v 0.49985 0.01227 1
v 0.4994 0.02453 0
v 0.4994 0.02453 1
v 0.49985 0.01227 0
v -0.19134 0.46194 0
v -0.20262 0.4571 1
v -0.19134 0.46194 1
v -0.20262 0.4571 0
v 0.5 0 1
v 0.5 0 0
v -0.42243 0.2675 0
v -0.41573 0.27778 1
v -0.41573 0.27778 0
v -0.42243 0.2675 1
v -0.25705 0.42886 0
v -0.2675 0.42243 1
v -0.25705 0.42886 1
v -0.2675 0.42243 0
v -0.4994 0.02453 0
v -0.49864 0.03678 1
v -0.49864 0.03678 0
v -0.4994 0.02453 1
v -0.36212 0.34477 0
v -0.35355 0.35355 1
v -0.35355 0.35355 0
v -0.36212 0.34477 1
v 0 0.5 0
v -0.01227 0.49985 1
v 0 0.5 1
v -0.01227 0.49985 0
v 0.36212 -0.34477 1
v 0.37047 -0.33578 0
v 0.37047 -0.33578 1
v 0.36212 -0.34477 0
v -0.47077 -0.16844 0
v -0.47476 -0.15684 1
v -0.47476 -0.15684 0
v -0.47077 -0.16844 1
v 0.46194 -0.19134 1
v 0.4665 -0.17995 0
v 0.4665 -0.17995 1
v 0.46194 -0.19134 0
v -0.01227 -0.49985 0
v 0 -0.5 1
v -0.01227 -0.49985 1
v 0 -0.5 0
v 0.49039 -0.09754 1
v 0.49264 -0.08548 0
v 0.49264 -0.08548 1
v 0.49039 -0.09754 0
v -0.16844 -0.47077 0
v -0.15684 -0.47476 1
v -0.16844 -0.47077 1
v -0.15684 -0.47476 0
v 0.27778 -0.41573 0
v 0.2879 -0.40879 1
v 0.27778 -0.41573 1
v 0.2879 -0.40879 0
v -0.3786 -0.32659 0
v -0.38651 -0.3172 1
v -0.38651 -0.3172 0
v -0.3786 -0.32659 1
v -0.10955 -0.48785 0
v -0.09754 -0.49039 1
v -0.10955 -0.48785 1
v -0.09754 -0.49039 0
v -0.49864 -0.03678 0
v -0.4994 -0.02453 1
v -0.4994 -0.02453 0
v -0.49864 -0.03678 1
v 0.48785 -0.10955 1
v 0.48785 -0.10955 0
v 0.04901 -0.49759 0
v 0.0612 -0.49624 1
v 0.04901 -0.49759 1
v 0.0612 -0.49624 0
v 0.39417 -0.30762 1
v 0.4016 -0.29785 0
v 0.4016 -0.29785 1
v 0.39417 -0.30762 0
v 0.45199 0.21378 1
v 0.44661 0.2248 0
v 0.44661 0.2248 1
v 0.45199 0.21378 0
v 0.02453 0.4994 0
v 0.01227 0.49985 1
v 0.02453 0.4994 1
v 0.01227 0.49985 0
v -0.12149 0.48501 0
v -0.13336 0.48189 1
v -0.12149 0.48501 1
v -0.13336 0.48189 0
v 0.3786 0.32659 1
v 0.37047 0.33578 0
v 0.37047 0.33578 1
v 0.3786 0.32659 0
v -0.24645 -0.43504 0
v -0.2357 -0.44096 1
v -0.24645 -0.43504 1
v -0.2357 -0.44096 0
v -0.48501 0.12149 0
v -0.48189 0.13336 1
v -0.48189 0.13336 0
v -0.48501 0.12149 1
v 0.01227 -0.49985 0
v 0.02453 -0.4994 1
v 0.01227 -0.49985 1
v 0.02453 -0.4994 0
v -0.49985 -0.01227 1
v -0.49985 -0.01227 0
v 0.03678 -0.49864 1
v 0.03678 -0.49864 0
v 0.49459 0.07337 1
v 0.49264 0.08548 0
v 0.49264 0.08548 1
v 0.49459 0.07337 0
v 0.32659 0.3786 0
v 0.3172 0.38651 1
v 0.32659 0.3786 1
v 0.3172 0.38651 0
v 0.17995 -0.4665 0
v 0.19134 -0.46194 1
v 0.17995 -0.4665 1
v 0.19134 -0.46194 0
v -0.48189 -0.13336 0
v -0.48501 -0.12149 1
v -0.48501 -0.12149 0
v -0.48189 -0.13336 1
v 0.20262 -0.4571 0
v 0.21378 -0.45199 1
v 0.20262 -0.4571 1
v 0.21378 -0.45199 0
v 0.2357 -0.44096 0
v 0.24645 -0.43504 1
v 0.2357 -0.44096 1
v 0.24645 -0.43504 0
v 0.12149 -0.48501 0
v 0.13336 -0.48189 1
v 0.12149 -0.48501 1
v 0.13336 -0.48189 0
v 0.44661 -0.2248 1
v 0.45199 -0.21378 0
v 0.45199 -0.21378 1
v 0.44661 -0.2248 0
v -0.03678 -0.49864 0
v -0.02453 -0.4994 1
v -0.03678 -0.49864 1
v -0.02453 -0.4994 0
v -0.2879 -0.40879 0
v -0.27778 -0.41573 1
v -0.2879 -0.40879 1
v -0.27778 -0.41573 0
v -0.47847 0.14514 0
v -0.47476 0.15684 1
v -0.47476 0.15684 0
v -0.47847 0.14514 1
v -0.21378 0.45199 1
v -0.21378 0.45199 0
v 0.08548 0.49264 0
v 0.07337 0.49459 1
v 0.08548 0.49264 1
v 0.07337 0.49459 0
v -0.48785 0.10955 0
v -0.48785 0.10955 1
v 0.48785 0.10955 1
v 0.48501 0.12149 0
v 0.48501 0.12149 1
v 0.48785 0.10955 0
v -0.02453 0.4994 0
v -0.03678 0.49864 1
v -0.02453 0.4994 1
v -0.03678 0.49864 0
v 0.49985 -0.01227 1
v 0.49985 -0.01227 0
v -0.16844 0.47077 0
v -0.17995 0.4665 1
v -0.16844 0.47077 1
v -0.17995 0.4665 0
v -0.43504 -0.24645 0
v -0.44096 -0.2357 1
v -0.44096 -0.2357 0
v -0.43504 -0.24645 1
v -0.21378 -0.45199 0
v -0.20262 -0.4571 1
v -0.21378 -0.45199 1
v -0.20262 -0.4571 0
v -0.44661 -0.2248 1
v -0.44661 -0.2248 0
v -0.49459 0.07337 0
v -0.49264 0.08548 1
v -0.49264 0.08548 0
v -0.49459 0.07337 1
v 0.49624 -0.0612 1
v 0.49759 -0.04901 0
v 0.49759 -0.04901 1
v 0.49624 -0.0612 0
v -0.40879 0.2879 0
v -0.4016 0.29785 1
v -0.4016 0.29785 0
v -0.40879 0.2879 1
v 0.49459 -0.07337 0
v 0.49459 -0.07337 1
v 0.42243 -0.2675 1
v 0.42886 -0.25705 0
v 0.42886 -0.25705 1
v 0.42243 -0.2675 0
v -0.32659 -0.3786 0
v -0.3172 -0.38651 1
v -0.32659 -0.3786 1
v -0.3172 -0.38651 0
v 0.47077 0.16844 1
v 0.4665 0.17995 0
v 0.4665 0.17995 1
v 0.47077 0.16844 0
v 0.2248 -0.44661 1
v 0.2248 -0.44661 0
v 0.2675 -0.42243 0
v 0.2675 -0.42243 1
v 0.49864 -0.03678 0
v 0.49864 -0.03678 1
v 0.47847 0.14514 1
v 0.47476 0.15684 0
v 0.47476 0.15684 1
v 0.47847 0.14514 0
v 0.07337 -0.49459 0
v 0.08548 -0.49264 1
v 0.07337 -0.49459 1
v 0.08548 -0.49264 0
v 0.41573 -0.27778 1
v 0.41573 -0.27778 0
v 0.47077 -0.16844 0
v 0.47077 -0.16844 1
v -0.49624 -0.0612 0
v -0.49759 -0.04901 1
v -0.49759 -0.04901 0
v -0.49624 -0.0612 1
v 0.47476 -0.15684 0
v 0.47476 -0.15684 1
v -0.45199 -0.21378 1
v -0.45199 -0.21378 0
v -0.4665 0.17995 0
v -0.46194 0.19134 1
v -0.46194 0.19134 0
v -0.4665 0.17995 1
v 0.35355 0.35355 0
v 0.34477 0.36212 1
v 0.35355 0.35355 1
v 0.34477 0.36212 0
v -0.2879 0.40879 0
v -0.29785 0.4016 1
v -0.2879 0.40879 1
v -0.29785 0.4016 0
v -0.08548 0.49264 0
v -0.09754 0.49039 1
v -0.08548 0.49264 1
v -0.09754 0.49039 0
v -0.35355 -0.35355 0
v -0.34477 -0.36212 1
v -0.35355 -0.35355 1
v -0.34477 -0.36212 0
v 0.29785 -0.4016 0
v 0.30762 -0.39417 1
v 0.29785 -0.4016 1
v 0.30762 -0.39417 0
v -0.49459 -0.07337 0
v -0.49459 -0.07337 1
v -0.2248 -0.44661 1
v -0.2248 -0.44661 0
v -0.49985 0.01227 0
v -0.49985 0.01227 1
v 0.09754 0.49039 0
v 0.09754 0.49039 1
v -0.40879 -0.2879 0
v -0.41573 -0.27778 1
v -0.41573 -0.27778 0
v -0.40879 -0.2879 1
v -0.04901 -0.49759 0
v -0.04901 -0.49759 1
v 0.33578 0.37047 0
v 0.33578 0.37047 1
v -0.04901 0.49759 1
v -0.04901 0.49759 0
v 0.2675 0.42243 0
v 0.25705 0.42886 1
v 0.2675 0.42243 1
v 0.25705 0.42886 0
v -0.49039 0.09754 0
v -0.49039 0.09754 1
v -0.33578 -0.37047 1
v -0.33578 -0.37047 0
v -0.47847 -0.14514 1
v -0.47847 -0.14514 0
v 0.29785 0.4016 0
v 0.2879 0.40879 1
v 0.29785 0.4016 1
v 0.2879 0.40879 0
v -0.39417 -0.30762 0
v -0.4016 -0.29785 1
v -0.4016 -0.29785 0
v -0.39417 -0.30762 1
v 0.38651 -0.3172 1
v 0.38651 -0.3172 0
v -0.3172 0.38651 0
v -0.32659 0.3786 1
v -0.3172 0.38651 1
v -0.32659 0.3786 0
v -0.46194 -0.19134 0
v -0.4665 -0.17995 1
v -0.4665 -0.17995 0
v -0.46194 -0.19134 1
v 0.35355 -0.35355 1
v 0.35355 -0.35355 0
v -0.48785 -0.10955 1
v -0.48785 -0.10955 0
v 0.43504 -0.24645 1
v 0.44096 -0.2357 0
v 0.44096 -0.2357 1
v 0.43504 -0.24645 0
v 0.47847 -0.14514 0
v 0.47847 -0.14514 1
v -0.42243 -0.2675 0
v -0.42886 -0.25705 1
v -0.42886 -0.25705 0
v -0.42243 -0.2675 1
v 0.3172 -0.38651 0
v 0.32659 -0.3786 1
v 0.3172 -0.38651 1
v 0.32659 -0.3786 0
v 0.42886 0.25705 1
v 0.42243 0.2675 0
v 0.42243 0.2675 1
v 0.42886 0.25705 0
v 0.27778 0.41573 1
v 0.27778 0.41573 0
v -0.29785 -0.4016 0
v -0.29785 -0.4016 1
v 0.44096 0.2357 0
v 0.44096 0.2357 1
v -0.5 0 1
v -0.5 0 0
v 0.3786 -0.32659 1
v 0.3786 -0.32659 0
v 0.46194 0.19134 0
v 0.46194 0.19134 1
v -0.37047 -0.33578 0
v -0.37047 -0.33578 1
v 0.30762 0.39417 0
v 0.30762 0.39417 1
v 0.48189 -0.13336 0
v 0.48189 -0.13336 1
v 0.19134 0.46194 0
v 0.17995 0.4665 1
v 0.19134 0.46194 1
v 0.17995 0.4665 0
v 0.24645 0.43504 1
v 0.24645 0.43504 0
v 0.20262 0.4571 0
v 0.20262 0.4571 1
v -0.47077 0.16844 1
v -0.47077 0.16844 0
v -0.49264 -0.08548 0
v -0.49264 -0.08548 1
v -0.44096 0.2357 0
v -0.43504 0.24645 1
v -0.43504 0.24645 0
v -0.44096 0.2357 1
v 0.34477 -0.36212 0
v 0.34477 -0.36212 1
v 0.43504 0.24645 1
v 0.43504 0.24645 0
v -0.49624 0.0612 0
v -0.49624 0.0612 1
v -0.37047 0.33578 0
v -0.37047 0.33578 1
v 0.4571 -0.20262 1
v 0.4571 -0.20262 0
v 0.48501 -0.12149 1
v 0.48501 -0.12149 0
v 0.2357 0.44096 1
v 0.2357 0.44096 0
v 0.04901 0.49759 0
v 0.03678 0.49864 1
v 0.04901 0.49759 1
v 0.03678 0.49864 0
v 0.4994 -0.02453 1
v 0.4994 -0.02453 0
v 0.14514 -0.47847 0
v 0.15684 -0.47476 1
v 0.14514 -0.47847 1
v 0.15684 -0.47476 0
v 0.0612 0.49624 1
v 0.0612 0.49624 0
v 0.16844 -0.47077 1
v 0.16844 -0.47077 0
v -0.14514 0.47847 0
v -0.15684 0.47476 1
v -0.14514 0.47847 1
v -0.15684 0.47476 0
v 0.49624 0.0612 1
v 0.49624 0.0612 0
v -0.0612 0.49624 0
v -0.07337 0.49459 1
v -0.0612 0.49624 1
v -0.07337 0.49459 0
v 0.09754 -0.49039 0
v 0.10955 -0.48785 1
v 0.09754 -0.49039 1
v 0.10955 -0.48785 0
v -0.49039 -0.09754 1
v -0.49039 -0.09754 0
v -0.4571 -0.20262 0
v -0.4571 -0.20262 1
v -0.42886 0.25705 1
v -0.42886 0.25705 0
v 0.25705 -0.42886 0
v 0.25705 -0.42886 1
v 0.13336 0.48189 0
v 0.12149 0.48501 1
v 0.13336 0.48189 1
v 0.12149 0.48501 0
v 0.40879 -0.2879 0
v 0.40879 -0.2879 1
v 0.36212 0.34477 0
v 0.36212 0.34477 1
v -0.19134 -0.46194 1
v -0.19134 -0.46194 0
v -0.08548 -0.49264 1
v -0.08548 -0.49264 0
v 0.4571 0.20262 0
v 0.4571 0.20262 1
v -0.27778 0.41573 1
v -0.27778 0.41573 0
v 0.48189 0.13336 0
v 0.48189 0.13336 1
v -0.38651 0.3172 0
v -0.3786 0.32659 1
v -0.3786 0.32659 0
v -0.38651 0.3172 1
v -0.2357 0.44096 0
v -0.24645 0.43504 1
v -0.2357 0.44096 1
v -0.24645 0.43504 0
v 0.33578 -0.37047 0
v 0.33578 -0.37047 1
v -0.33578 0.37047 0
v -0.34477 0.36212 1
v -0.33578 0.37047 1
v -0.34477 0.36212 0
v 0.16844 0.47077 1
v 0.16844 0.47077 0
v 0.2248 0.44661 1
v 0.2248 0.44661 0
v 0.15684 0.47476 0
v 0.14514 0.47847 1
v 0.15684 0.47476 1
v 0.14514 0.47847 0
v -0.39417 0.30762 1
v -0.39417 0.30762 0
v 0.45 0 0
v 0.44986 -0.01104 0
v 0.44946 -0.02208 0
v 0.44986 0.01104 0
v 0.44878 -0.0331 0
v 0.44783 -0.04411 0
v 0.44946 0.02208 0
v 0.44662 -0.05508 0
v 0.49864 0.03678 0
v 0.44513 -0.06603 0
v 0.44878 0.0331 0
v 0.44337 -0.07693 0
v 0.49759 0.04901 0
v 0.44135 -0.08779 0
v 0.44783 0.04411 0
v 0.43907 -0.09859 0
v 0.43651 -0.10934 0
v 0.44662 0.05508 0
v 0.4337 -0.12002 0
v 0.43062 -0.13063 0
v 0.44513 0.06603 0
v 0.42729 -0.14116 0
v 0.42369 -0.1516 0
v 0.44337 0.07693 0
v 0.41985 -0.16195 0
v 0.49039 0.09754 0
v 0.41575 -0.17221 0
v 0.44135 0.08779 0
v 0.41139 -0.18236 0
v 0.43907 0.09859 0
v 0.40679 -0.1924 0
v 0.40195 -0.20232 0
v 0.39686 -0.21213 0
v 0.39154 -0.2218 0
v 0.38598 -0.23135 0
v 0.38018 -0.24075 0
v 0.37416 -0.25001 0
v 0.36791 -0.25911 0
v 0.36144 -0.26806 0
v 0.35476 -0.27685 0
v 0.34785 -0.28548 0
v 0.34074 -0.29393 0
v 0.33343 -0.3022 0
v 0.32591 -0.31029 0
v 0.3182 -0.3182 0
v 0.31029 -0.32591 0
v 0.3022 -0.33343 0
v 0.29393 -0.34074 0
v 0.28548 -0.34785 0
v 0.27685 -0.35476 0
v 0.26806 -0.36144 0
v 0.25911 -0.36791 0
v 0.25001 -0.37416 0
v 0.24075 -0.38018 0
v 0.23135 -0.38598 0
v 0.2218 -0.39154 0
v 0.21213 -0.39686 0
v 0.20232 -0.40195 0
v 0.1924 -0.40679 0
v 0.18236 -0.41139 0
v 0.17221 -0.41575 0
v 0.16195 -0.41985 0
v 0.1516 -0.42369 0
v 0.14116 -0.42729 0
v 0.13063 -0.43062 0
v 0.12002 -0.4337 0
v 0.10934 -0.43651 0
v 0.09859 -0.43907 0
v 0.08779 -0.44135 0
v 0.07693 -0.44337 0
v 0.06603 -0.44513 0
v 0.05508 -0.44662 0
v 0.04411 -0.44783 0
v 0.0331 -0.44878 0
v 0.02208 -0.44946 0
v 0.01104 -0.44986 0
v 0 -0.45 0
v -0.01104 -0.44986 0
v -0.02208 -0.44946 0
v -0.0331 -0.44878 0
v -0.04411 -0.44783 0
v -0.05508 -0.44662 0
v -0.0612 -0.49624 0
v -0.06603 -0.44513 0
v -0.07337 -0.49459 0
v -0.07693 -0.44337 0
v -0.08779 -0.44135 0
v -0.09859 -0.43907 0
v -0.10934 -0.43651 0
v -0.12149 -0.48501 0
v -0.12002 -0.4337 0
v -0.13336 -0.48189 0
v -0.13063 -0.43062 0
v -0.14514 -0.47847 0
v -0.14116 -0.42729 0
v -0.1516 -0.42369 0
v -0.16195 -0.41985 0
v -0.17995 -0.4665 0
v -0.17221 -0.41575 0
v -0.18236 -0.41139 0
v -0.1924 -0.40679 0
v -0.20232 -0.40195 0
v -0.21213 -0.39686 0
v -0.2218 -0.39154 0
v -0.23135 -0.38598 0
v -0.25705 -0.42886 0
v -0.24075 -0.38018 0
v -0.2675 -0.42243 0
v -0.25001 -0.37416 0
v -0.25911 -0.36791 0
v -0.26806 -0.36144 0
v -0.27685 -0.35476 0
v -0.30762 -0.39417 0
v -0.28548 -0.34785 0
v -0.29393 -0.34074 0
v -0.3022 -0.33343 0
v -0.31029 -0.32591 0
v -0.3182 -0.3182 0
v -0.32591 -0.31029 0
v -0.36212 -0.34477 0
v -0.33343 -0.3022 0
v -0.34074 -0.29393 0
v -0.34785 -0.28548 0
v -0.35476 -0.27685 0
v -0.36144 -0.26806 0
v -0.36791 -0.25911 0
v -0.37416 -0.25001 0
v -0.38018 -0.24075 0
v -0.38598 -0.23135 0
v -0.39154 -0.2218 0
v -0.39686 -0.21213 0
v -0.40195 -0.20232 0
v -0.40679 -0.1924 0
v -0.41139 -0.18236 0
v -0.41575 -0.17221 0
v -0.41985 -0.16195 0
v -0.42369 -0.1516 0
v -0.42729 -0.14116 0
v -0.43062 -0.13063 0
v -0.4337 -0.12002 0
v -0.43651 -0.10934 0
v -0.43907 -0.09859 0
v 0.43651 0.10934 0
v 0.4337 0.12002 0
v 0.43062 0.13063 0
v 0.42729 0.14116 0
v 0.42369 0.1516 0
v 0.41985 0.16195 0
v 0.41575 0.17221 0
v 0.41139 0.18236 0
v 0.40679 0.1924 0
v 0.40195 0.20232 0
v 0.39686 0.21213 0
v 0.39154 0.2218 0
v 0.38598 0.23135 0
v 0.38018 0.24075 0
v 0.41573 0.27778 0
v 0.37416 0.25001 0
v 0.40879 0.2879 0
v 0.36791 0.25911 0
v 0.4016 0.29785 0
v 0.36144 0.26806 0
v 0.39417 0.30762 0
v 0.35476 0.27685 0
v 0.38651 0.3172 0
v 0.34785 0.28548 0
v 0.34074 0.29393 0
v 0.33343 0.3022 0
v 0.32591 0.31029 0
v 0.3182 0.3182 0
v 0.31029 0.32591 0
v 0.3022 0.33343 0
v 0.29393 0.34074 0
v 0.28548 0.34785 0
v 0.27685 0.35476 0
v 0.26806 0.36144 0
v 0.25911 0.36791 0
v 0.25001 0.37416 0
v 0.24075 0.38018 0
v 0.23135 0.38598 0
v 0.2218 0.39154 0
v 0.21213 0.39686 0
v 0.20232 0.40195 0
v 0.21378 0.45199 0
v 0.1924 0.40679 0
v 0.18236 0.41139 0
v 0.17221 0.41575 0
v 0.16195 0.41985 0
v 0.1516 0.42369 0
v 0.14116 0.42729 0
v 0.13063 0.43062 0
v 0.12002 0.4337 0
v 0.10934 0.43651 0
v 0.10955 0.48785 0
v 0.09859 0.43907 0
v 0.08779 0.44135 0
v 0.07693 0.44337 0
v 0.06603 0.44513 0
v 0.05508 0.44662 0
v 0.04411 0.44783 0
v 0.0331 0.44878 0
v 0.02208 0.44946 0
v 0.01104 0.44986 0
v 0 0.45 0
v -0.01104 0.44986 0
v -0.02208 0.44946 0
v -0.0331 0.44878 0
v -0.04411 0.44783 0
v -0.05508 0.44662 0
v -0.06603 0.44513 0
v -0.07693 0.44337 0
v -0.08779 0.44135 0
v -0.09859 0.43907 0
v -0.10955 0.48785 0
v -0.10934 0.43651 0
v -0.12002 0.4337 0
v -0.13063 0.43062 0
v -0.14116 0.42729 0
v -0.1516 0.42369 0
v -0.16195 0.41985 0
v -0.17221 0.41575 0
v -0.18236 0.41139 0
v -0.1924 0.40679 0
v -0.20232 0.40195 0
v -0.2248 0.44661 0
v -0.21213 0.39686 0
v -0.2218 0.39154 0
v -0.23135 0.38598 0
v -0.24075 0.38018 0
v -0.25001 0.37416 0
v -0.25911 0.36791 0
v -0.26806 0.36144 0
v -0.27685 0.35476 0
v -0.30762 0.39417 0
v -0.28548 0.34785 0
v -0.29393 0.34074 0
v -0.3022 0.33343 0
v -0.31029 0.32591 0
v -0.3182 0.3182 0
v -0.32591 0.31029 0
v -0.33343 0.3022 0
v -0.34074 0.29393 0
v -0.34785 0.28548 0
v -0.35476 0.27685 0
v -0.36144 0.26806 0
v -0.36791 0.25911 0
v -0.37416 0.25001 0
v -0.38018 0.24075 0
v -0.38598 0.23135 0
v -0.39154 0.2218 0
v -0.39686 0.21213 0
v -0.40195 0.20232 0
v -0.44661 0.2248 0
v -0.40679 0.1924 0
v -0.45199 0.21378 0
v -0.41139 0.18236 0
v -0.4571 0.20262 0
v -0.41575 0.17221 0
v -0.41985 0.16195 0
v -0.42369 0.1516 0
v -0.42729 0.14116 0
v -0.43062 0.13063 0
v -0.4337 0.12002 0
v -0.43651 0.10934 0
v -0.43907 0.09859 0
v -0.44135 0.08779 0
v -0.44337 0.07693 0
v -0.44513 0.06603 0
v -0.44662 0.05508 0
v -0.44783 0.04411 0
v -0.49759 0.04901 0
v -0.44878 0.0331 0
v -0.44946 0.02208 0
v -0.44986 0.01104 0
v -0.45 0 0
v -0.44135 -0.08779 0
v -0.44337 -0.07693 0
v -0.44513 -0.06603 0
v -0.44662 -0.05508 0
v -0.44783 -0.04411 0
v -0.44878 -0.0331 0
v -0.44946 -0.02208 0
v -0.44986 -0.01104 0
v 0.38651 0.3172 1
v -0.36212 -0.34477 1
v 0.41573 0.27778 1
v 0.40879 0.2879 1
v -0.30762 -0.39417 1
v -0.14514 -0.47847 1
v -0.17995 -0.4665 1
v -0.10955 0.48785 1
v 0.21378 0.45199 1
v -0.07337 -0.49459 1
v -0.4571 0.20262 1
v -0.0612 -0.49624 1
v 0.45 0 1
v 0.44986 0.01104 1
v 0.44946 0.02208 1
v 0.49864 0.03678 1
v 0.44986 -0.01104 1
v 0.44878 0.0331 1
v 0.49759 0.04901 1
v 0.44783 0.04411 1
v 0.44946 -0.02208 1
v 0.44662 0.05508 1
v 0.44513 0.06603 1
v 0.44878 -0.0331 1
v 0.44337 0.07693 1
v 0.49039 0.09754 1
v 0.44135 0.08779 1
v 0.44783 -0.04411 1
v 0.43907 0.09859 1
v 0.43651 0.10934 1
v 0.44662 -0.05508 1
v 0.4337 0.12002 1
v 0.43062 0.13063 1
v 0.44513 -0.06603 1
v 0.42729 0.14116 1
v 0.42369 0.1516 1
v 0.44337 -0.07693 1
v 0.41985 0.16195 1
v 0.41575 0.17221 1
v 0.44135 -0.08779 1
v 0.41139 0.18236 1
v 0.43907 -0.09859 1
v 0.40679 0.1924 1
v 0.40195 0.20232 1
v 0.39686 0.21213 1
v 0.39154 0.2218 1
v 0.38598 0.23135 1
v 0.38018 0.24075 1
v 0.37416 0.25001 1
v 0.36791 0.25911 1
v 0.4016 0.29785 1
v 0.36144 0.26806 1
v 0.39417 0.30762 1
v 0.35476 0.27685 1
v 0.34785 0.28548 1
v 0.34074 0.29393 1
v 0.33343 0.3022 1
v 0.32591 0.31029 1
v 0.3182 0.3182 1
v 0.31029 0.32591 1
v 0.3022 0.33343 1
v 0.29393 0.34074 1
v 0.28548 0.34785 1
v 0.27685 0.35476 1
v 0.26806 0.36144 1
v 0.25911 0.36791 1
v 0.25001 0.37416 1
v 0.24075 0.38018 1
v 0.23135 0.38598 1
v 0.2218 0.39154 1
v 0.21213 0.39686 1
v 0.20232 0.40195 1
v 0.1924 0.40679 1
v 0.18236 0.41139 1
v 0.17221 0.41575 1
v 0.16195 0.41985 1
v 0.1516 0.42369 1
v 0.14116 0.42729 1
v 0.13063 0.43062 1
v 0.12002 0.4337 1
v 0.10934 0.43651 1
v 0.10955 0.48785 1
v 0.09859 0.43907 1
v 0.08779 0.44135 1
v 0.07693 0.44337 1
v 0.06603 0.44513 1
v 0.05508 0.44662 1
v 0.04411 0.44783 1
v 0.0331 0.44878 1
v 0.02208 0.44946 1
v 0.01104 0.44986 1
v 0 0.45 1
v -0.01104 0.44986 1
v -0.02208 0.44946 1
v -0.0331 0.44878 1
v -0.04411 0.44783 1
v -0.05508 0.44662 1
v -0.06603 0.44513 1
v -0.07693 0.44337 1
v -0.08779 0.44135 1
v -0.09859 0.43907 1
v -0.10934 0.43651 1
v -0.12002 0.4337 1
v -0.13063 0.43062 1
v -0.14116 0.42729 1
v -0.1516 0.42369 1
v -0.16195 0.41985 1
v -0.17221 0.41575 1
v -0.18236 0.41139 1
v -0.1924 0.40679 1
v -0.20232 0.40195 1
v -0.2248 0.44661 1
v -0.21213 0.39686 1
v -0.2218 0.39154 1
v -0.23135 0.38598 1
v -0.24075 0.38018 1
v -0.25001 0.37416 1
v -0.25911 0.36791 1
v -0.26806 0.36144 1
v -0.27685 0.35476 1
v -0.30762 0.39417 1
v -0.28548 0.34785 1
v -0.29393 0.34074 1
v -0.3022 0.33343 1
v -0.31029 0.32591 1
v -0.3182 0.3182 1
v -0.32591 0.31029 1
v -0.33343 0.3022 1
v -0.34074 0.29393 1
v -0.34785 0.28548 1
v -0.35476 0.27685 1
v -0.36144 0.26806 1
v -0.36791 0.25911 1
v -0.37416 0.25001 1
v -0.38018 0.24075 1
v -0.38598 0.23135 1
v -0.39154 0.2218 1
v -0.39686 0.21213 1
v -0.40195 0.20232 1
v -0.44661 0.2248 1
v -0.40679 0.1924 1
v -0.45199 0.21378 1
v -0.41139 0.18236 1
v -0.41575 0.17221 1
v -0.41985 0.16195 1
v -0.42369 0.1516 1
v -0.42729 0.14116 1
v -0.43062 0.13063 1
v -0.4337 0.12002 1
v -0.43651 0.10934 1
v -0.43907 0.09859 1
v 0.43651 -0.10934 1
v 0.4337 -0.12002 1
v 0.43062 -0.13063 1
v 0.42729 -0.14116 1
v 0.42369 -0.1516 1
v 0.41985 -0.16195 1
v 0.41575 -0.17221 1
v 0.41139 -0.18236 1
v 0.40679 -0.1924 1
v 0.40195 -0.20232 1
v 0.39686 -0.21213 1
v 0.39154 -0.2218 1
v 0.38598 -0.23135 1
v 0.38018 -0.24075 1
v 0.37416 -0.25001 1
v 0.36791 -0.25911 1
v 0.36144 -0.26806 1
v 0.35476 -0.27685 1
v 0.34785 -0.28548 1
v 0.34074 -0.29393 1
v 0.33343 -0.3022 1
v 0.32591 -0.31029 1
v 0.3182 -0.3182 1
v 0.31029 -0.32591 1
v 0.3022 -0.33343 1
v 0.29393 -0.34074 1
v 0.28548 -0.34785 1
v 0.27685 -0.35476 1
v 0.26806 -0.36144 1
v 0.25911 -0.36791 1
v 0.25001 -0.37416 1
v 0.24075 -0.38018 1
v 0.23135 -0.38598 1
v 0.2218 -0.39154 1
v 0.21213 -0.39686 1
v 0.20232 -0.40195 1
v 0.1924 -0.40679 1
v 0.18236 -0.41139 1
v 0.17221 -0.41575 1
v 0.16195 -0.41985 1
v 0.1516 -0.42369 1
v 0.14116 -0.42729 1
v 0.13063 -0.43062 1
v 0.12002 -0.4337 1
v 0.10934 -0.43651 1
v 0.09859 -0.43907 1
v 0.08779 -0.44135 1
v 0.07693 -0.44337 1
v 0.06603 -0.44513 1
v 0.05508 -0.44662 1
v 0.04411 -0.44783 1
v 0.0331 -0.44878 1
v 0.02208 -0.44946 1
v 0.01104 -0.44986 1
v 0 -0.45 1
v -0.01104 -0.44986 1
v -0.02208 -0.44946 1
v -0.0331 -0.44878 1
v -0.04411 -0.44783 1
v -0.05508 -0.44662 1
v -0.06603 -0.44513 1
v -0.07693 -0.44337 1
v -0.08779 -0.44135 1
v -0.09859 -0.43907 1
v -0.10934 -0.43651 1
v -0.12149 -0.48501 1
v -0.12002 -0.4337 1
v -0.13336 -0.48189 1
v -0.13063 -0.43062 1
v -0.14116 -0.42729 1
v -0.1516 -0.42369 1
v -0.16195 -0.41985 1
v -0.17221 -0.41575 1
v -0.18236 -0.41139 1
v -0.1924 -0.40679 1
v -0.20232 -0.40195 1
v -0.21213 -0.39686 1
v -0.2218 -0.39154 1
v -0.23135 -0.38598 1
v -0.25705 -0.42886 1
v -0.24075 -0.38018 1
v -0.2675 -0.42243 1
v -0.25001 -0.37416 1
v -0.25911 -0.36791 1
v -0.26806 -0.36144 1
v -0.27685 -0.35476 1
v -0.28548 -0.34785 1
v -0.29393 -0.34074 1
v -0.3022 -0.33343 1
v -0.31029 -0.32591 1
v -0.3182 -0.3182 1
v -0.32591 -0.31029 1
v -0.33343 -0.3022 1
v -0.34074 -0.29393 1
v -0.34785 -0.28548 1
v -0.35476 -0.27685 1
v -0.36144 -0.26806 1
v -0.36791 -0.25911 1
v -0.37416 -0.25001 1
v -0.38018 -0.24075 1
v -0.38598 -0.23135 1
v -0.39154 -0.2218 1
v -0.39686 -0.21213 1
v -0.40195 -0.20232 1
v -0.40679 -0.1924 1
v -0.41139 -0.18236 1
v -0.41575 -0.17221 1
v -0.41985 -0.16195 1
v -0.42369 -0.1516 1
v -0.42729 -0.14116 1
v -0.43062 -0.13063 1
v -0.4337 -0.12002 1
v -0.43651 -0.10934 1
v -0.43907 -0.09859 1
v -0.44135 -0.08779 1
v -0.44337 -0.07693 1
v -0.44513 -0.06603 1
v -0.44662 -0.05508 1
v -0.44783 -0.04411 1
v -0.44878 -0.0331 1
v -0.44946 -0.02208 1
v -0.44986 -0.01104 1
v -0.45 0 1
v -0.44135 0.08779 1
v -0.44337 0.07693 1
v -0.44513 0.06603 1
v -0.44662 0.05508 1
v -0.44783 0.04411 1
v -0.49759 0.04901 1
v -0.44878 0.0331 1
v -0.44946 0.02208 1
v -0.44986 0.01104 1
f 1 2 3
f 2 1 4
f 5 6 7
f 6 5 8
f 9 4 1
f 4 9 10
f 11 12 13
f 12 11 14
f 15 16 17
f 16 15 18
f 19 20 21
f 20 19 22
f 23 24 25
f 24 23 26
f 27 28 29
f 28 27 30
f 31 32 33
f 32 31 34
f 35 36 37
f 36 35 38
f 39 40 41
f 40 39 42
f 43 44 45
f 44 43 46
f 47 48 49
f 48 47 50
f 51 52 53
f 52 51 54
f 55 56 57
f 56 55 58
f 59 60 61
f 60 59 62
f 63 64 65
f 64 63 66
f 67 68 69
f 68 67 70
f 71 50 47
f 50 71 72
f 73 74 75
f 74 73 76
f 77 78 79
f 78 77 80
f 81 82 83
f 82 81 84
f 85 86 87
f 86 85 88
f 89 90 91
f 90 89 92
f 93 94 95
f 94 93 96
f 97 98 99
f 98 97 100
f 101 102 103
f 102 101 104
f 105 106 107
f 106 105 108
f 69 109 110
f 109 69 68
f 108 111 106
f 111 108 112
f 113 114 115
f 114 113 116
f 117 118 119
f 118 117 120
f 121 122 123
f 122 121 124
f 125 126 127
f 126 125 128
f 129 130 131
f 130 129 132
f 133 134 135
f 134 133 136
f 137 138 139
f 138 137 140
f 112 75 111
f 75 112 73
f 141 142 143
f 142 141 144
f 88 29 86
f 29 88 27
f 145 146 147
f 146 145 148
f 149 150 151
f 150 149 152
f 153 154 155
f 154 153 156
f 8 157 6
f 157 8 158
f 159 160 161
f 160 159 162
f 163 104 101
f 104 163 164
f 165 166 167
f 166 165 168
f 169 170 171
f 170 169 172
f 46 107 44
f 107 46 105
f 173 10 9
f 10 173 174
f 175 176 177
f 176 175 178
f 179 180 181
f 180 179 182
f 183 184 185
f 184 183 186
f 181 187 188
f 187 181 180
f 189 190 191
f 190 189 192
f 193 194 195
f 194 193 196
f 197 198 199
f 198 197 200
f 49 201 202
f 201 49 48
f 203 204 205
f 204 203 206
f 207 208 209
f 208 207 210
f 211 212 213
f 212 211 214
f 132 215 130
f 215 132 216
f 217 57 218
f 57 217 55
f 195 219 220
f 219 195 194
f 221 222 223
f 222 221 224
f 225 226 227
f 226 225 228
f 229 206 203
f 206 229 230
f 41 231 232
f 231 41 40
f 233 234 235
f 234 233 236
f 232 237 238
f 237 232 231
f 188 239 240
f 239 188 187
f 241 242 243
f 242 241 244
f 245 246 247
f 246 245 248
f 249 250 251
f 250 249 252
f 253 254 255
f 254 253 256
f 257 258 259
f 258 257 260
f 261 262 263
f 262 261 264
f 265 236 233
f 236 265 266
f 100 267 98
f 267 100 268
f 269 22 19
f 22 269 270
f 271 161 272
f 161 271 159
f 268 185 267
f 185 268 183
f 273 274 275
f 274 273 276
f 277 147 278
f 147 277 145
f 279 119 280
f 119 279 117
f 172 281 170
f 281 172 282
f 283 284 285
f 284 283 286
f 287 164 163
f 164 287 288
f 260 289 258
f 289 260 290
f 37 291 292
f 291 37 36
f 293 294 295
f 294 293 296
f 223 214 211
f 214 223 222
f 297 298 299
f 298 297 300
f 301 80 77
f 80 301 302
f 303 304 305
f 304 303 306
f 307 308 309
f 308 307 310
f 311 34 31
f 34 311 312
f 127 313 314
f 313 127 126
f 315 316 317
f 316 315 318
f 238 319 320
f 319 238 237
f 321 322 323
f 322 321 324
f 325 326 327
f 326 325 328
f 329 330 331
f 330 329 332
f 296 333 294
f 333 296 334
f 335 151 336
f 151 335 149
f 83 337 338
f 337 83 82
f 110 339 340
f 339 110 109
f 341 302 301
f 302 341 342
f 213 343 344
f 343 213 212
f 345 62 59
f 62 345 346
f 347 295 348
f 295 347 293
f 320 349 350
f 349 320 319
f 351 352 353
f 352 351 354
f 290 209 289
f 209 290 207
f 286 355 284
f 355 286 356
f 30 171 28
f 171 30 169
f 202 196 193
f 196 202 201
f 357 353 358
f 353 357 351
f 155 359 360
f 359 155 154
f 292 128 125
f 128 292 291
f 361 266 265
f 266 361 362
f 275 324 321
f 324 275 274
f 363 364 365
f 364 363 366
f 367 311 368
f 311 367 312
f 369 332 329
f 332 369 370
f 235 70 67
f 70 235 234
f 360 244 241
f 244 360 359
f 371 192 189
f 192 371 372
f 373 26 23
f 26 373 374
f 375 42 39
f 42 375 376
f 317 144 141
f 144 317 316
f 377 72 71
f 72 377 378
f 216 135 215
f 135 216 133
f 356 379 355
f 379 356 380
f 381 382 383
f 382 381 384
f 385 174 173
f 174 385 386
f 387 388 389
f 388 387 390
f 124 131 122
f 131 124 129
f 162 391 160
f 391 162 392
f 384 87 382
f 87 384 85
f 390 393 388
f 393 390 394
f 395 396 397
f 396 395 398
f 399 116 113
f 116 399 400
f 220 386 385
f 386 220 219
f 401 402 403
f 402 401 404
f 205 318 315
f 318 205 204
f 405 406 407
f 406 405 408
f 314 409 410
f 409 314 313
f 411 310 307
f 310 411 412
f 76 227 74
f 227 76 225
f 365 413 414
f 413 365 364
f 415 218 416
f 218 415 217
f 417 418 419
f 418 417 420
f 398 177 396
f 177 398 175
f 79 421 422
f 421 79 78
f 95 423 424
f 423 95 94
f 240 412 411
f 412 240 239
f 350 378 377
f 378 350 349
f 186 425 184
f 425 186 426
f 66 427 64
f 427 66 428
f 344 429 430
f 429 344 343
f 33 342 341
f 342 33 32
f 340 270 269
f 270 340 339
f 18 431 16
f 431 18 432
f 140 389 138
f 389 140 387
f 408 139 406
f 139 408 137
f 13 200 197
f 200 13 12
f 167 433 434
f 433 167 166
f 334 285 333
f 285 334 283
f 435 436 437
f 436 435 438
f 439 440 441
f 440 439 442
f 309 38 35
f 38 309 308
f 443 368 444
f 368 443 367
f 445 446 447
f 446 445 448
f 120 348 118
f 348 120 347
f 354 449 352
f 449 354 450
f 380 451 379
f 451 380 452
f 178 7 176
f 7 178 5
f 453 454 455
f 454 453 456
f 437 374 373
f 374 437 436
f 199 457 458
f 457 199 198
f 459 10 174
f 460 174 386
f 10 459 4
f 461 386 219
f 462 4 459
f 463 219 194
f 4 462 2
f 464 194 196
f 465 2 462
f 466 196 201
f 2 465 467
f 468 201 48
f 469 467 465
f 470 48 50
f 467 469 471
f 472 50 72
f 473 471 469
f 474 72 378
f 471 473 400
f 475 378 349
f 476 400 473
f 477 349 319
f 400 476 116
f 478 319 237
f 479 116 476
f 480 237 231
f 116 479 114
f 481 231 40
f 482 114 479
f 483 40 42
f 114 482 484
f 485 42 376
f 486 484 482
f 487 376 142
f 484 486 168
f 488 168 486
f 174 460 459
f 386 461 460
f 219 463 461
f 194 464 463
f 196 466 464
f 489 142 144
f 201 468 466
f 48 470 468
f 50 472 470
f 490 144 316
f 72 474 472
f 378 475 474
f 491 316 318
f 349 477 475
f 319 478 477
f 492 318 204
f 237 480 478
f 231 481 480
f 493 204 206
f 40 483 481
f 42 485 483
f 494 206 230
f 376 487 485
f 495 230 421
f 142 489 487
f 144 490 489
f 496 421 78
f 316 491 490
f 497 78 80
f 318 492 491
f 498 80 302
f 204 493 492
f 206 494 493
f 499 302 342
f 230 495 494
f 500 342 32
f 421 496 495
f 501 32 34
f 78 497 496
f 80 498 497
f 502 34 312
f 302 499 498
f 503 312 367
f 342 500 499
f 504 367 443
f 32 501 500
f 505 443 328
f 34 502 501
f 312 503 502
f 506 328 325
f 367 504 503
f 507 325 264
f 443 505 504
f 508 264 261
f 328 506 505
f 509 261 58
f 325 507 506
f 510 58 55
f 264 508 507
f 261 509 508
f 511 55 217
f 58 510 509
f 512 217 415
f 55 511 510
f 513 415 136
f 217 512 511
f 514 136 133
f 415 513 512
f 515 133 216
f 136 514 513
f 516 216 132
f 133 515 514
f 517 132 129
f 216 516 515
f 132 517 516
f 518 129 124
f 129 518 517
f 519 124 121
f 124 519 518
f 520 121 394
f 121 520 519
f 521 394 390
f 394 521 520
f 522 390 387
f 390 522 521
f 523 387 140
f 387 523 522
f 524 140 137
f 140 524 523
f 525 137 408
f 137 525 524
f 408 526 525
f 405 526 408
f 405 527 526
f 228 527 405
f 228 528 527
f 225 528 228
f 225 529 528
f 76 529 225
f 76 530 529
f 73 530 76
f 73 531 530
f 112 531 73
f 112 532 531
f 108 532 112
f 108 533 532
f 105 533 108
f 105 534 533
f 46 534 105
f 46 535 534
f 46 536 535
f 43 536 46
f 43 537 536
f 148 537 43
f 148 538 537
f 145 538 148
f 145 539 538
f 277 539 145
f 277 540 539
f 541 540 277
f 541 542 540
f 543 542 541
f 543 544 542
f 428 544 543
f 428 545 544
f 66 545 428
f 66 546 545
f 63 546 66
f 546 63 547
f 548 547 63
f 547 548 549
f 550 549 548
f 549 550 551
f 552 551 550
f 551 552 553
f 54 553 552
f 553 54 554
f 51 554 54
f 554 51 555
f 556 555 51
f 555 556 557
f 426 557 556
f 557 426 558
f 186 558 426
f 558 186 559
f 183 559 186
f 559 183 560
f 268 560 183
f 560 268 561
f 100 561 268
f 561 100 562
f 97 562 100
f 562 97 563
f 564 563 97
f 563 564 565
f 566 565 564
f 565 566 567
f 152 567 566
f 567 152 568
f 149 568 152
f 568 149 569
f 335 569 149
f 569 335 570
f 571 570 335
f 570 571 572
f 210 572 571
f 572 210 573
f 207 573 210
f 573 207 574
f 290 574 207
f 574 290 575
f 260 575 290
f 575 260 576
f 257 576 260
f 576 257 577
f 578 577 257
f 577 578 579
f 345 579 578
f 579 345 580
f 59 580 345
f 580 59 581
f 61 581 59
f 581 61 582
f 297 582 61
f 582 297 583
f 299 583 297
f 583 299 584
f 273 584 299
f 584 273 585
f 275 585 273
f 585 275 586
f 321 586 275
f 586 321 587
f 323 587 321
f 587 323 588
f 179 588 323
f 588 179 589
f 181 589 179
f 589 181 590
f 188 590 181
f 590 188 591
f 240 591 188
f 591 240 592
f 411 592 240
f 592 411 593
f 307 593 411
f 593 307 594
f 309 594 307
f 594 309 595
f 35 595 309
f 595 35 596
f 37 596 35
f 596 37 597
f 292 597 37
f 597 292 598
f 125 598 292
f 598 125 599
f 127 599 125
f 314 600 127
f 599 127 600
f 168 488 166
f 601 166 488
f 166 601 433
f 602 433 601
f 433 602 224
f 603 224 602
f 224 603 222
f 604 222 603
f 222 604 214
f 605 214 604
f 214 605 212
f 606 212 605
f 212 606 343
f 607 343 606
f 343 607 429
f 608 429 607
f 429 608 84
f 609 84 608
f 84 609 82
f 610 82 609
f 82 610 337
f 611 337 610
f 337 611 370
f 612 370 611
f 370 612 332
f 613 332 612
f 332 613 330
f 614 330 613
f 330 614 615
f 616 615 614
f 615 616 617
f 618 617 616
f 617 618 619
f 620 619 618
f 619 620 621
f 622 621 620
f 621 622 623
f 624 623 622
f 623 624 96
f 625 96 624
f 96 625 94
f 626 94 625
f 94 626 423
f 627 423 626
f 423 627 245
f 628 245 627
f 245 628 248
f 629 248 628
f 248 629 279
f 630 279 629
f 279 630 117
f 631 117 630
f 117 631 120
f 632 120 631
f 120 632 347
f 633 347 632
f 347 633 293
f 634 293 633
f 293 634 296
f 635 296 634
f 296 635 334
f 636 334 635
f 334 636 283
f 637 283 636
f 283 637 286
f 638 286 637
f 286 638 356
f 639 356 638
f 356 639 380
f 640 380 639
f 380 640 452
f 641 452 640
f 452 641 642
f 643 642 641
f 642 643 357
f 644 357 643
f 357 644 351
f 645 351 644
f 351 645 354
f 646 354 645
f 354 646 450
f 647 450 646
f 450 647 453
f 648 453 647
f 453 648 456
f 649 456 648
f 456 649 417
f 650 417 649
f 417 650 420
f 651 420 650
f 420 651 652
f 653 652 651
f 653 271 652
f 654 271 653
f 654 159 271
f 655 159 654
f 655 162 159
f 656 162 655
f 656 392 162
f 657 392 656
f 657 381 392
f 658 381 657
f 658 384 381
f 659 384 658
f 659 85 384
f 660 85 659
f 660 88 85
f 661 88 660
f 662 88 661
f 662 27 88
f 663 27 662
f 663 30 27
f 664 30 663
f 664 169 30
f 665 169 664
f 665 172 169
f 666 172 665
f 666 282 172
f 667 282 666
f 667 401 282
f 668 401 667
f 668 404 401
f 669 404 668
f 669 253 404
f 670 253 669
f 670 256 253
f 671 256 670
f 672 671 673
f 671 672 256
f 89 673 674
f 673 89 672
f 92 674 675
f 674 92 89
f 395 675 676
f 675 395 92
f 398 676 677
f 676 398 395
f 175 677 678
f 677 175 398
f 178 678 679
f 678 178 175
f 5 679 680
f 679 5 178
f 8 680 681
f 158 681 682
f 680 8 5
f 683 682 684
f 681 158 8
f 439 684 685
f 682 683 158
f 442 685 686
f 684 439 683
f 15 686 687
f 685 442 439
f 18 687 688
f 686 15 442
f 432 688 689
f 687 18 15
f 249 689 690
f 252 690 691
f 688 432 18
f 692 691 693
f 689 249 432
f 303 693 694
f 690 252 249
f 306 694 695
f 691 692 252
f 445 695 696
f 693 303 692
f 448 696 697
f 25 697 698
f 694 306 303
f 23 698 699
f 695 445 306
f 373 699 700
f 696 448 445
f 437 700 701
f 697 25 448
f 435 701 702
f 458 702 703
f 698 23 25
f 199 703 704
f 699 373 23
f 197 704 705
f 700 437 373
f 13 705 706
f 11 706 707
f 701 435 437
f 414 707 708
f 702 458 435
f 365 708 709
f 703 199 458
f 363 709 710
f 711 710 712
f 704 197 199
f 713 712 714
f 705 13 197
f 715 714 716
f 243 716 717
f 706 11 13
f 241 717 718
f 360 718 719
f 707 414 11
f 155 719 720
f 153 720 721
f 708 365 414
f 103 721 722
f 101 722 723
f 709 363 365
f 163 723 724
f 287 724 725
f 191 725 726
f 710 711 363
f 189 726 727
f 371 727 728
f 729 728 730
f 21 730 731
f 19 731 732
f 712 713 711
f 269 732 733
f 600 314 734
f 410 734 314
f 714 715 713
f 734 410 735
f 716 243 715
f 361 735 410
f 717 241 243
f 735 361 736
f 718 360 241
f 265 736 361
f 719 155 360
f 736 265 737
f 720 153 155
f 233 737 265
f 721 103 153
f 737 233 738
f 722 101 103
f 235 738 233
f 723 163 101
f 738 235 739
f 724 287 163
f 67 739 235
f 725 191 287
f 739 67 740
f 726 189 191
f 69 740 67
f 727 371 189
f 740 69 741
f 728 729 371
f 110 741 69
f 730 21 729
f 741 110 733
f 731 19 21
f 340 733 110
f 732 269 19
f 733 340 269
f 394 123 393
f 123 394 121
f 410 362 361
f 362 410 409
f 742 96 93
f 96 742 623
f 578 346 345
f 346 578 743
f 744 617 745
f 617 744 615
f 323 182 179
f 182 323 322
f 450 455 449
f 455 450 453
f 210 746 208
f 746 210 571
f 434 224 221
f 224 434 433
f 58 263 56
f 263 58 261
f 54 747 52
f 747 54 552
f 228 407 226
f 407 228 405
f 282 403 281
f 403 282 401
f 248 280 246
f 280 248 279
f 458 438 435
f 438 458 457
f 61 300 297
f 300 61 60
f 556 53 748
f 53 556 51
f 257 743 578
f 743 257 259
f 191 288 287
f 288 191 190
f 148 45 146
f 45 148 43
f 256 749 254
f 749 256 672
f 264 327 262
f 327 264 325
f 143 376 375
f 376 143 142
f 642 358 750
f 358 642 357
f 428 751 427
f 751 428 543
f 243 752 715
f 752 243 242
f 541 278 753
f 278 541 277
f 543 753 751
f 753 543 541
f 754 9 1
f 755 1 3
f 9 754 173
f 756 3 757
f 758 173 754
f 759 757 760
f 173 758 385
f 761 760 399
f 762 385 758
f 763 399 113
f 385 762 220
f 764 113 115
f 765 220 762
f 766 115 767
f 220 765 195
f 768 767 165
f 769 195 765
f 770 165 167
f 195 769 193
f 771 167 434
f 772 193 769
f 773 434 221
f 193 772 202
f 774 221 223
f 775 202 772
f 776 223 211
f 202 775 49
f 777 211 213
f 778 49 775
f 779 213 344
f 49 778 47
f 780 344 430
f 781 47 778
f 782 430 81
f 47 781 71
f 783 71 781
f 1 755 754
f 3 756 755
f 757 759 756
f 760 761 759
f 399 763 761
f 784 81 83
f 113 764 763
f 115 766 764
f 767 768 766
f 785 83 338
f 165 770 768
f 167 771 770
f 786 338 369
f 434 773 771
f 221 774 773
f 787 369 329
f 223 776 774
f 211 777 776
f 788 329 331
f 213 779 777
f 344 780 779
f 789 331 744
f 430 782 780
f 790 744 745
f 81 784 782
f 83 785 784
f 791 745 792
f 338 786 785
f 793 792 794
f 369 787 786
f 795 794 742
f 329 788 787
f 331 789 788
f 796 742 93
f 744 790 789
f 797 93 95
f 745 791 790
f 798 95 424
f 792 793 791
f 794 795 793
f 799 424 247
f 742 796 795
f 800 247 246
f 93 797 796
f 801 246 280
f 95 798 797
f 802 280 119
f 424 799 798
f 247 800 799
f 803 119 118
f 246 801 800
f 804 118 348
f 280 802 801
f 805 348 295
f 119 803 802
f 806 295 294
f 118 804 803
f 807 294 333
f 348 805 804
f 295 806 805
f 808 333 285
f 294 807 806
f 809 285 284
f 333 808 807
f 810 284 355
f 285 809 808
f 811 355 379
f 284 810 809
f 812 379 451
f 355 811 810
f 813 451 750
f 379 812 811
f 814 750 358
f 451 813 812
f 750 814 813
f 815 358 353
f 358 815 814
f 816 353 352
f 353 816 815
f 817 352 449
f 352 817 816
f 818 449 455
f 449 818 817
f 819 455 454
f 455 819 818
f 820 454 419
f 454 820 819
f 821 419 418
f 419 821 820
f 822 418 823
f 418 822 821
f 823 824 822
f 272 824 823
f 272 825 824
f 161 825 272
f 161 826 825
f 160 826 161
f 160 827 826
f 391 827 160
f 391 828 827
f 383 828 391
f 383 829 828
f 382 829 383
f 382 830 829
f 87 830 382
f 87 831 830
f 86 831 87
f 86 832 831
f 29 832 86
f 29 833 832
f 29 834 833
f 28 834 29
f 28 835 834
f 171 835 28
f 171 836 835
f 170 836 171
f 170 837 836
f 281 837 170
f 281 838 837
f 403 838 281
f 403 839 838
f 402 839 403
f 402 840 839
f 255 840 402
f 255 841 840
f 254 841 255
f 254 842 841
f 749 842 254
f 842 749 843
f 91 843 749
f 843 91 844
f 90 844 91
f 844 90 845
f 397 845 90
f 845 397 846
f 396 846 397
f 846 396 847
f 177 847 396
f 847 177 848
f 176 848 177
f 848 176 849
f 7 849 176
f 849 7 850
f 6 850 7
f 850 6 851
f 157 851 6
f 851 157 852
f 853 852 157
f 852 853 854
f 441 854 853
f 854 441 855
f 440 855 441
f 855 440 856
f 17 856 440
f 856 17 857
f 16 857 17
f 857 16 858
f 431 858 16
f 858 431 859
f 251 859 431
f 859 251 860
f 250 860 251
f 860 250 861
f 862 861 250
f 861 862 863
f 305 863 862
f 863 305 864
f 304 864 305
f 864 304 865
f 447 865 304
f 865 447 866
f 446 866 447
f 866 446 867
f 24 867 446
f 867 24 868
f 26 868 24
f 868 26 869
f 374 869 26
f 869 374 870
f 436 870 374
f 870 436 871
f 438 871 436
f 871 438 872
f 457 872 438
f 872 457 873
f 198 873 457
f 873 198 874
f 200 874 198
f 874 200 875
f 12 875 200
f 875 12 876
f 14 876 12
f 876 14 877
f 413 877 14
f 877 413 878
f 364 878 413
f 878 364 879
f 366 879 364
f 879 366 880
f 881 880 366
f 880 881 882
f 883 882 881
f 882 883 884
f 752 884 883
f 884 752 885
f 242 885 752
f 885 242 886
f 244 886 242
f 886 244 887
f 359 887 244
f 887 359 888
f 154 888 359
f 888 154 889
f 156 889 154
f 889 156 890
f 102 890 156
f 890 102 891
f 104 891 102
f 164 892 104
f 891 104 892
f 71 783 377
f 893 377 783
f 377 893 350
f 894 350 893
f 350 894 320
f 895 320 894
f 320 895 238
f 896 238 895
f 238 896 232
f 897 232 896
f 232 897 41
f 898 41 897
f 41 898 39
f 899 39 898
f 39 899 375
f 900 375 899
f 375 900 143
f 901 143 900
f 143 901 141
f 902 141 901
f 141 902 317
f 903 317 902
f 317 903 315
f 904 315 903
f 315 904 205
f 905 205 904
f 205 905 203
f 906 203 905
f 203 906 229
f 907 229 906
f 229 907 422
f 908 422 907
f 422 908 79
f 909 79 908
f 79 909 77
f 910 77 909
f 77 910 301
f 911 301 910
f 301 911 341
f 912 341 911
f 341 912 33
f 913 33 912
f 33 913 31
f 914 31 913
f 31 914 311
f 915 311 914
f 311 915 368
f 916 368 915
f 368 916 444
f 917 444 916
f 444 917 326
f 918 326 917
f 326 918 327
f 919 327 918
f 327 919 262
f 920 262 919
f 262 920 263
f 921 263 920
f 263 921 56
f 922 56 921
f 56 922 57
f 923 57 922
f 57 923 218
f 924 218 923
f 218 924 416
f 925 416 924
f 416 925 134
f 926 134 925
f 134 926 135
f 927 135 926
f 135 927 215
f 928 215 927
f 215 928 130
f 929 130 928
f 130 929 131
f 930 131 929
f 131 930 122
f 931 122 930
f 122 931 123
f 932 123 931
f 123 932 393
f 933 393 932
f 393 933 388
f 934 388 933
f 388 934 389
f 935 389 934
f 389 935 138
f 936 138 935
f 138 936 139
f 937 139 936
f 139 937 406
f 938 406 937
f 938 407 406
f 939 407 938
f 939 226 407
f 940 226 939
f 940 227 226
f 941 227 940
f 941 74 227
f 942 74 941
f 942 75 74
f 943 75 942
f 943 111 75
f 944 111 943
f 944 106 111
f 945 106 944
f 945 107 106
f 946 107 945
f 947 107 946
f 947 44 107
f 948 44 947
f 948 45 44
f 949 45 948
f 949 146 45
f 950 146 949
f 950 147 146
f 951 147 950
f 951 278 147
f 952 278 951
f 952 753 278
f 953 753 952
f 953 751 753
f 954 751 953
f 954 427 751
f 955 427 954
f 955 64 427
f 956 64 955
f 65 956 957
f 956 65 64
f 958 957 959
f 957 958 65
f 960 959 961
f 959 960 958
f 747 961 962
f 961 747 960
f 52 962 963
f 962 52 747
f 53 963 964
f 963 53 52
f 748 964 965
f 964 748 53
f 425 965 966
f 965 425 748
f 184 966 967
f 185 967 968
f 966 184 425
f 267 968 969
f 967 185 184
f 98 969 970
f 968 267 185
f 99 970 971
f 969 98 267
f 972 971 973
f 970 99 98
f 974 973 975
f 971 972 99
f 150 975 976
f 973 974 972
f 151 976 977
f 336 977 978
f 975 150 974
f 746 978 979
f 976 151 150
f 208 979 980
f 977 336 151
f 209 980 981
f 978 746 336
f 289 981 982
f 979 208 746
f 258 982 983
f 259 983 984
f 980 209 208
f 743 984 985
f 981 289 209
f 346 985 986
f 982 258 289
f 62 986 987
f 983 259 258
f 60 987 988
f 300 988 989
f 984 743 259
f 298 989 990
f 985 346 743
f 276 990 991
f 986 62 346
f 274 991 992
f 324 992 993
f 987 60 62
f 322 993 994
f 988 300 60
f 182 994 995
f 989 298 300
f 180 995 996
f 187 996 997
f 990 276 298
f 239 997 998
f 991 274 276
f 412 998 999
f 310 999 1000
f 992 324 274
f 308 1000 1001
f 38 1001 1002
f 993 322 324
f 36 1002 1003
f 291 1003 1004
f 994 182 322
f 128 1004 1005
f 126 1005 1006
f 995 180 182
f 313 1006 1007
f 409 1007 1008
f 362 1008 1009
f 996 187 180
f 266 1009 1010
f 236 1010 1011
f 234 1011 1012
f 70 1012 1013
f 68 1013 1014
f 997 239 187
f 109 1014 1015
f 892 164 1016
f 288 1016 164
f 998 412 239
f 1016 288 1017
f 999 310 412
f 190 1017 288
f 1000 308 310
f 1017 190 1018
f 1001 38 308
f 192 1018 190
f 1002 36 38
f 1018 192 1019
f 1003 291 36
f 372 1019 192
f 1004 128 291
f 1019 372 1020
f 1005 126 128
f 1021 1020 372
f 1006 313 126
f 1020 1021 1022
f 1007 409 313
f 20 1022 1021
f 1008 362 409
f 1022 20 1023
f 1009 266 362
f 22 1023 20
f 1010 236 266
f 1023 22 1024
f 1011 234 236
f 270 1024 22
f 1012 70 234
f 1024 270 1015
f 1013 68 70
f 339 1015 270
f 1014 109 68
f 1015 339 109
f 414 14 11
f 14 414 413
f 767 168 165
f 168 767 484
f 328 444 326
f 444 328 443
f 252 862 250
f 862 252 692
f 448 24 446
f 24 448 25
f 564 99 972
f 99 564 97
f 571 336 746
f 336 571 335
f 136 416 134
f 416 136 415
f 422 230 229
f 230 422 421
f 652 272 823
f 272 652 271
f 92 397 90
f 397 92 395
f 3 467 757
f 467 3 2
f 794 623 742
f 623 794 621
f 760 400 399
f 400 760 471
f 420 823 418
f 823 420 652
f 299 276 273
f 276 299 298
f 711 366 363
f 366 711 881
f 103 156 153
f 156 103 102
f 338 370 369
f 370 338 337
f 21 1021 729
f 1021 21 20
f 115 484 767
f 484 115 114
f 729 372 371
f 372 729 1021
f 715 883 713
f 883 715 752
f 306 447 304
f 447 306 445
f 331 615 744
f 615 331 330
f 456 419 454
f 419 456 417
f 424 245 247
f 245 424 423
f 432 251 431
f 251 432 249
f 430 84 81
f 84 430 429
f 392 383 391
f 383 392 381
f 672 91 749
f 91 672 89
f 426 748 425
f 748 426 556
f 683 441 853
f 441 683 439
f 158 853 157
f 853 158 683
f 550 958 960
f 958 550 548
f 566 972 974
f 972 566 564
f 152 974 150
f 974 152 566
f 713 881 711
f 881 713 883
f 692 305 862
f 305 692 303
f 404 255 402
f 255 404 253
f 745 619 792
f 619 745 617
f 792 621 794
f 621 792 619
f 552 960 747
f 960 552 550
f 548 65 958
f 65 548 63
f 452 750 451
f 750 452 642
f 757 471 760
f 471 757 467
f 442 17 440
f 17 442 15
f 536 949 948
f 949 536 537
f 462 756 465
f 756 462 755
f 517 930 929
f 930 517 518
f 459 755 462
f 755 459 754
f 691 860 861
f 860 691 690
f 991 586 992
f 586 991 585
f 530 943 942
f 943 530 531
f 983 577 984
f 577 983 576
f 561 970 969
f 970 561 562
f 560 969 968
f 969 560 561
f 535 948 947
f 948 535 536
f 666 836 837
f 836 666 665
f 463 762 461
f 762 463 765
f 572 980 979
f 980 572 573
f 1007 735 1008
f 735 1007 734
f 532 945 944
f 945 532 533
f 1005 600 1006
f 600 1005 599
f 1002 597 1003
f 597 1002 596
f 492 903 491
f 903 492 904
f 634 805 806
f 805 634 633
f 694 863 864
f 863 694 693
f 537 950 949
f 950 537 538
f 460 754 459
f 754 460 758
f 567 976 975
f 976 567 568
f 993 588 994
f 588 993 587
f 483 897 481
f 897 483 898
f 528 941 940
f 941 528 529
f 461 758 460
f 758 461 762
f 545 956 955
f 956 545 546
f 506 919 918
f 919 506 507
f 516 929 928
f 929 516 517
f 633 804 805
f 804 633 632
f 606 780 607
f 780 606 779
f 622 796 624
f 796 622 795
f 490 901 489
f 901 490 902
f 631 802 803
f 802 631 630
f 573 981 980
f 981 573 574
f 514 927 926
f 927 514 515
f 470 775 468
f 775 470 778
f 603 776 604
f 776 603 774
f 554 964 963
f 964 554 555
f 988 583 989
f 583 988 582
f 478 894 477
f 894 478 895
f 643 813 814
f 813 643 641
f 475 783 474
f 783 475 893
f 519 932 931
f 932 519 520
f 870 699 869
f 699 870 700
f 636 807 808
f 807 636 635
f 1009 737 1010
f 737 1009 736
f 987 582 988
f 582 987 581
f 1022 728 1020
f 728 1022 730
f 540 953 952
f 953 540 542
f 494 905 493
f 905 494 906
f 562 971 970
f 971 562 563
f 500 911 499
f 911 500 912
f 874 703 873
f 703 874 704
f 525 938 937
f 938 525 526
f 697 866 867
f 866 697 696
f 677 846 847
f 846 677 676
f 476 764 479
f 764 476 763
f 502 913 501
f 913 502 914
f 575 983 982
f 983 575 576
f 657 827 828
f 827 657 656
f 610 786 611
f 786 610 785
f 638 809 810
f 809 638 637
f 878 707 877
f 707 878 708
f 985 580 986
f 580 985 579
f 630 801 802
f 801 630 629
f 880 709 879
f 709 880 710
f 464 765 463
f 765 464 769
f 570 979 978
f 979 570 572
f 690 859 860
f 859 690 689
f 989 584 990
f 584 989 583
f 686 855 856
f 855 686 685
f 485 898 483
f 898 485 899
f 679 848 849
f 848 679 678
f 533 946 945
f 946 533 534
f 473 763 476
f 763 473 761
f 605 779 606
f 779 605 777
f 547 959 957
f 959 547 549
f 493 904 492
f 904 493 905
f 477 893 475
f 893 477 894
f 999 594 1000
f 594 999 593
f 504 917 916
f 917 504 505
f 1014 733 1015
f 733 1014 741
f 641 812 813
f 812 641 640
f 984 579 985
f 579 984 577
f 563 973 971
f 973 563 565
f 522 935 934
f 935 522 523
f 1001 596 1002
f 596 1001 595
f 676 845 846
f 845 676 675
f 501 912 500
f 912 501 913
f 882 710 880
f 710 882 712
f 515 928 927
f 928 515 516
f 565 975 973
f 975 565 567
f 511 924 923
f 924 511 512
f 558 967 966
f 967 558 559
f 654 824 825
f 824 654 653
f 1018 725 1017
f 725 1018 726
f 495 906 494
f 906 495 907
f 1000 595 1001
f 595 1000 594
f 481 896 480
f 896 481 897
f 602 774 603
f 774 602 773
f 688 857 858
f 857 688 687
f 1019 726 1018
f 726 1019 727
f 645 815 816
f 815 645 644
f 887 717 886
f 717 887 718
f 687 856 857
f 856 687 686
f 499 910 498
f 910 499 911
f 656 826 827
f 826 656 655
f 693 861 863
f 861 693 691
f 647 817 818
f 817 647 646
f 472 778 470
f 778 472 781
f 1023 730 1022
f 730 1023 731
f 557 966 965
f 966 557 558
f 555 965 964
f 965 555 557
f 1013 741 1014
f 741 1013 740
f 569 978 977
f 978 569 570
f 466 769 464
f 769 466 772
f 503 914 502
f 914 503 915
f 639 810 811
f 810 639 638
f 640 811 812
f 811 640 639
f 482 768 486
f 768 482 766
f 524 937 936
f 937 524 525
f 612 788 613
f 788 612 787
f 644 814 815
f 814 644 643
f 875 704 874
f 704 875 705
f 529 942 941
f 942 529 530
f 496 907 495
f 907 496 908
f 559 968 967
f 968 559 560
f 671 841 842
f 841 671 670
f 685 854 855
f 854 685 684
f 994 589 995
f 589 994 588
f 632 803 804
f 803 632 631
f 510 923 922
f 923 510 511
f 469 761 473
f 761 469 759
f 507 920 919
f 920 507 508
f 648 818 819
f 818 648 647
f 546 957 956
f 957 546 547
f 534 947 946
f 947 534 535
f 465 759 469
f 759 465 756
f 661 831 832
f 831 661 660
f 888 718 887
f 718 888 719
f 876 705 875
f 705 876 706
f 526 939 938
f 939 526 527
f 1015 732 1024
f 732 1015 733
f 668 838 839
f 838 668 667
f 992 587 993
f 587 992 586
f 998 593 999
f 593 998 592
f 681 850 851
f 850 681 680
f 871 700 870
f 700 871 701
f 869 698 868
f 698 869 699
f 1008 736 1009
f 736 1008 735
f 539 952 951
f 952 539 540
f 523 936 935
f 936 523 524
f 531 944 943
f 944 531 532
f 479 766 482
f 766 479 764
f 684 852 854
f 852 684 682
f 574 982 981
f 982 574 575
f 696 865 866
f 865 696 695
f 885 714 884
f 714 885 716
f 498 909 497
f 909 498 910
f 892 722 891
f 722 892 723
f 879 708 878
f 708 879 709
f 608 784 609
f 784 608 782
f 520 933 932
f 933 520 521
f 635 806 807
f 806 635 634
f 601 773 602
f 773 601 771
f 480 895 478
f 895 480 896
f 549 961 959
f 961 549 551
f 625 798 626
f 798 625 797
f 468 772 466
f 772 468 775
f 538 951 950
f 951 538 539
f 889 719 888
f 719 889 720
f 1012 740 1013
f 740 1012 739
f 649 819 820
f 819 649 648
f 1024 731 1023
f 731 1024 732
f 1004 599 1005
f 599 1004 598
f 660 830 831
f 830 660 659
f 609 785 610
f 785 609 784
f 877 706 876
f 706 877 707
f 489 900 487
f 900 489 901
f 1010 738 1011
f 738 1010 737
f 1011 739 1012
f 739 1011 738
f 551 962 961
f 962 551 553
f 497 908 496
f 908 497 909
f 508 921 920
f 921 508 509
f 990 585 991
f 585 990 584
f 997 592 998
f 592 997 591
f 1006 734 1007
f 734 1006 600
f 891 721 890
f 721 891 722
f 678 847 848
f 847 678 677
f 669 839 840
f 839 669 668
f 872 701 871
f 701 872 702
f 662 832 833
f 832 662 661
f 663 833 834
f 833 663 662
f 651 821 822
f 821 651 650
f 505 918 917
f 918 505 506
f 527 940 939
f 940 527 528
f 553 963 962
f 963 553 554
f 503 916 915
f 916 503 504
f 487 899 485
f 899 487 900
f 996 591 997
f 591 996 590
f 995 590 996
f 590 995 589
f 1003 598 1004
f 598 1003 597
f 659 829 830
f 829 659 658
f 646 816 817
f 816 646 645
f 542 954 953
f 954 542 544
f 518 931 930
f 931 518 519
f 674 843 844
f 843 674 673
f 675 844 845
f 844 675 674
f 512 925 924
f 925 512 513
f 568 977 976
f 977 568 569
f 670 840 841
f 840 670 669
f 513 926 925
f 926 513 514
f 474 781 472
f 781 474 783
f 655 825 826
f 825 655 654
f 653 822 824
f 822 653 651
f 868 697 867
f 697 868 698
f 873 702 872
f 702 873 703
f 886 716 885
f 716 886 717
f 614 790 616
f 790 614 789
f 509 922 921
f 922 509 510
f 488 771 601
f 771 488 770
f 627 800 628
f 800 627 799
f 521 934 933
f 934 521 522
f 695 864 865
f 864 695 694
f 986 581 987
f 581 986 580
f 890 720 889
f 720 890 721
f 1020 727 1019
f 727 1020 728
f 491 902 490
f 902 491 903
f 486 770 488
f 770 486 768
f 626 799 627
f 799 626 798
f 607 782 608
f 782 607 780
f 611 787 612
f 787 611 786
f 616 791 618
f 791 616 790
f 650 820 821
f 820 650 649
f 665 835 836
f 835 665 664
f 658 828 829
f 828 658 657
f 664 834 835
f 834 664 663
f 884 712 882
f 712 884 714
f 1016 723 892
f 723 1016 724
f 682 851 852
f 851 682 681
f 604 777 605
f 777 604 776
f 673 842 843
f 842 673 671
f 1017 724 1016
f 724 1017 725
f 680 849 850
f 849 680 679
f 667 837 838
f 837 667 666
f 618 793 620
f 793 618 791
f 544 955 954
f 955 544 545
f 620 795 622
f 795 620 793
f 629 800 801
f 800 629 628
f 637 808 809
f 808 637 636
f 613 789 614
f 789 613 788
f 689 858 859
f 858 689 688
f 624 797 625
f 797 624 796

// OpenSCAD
// Tube (Narrow) for Basic Shapes
// by Slashee the Cow
$fn = 256;

difference(){
    linear_extrude(1)
        circle(d=1);
    linear_extrude(1)
        circle(d=0.9);
}
